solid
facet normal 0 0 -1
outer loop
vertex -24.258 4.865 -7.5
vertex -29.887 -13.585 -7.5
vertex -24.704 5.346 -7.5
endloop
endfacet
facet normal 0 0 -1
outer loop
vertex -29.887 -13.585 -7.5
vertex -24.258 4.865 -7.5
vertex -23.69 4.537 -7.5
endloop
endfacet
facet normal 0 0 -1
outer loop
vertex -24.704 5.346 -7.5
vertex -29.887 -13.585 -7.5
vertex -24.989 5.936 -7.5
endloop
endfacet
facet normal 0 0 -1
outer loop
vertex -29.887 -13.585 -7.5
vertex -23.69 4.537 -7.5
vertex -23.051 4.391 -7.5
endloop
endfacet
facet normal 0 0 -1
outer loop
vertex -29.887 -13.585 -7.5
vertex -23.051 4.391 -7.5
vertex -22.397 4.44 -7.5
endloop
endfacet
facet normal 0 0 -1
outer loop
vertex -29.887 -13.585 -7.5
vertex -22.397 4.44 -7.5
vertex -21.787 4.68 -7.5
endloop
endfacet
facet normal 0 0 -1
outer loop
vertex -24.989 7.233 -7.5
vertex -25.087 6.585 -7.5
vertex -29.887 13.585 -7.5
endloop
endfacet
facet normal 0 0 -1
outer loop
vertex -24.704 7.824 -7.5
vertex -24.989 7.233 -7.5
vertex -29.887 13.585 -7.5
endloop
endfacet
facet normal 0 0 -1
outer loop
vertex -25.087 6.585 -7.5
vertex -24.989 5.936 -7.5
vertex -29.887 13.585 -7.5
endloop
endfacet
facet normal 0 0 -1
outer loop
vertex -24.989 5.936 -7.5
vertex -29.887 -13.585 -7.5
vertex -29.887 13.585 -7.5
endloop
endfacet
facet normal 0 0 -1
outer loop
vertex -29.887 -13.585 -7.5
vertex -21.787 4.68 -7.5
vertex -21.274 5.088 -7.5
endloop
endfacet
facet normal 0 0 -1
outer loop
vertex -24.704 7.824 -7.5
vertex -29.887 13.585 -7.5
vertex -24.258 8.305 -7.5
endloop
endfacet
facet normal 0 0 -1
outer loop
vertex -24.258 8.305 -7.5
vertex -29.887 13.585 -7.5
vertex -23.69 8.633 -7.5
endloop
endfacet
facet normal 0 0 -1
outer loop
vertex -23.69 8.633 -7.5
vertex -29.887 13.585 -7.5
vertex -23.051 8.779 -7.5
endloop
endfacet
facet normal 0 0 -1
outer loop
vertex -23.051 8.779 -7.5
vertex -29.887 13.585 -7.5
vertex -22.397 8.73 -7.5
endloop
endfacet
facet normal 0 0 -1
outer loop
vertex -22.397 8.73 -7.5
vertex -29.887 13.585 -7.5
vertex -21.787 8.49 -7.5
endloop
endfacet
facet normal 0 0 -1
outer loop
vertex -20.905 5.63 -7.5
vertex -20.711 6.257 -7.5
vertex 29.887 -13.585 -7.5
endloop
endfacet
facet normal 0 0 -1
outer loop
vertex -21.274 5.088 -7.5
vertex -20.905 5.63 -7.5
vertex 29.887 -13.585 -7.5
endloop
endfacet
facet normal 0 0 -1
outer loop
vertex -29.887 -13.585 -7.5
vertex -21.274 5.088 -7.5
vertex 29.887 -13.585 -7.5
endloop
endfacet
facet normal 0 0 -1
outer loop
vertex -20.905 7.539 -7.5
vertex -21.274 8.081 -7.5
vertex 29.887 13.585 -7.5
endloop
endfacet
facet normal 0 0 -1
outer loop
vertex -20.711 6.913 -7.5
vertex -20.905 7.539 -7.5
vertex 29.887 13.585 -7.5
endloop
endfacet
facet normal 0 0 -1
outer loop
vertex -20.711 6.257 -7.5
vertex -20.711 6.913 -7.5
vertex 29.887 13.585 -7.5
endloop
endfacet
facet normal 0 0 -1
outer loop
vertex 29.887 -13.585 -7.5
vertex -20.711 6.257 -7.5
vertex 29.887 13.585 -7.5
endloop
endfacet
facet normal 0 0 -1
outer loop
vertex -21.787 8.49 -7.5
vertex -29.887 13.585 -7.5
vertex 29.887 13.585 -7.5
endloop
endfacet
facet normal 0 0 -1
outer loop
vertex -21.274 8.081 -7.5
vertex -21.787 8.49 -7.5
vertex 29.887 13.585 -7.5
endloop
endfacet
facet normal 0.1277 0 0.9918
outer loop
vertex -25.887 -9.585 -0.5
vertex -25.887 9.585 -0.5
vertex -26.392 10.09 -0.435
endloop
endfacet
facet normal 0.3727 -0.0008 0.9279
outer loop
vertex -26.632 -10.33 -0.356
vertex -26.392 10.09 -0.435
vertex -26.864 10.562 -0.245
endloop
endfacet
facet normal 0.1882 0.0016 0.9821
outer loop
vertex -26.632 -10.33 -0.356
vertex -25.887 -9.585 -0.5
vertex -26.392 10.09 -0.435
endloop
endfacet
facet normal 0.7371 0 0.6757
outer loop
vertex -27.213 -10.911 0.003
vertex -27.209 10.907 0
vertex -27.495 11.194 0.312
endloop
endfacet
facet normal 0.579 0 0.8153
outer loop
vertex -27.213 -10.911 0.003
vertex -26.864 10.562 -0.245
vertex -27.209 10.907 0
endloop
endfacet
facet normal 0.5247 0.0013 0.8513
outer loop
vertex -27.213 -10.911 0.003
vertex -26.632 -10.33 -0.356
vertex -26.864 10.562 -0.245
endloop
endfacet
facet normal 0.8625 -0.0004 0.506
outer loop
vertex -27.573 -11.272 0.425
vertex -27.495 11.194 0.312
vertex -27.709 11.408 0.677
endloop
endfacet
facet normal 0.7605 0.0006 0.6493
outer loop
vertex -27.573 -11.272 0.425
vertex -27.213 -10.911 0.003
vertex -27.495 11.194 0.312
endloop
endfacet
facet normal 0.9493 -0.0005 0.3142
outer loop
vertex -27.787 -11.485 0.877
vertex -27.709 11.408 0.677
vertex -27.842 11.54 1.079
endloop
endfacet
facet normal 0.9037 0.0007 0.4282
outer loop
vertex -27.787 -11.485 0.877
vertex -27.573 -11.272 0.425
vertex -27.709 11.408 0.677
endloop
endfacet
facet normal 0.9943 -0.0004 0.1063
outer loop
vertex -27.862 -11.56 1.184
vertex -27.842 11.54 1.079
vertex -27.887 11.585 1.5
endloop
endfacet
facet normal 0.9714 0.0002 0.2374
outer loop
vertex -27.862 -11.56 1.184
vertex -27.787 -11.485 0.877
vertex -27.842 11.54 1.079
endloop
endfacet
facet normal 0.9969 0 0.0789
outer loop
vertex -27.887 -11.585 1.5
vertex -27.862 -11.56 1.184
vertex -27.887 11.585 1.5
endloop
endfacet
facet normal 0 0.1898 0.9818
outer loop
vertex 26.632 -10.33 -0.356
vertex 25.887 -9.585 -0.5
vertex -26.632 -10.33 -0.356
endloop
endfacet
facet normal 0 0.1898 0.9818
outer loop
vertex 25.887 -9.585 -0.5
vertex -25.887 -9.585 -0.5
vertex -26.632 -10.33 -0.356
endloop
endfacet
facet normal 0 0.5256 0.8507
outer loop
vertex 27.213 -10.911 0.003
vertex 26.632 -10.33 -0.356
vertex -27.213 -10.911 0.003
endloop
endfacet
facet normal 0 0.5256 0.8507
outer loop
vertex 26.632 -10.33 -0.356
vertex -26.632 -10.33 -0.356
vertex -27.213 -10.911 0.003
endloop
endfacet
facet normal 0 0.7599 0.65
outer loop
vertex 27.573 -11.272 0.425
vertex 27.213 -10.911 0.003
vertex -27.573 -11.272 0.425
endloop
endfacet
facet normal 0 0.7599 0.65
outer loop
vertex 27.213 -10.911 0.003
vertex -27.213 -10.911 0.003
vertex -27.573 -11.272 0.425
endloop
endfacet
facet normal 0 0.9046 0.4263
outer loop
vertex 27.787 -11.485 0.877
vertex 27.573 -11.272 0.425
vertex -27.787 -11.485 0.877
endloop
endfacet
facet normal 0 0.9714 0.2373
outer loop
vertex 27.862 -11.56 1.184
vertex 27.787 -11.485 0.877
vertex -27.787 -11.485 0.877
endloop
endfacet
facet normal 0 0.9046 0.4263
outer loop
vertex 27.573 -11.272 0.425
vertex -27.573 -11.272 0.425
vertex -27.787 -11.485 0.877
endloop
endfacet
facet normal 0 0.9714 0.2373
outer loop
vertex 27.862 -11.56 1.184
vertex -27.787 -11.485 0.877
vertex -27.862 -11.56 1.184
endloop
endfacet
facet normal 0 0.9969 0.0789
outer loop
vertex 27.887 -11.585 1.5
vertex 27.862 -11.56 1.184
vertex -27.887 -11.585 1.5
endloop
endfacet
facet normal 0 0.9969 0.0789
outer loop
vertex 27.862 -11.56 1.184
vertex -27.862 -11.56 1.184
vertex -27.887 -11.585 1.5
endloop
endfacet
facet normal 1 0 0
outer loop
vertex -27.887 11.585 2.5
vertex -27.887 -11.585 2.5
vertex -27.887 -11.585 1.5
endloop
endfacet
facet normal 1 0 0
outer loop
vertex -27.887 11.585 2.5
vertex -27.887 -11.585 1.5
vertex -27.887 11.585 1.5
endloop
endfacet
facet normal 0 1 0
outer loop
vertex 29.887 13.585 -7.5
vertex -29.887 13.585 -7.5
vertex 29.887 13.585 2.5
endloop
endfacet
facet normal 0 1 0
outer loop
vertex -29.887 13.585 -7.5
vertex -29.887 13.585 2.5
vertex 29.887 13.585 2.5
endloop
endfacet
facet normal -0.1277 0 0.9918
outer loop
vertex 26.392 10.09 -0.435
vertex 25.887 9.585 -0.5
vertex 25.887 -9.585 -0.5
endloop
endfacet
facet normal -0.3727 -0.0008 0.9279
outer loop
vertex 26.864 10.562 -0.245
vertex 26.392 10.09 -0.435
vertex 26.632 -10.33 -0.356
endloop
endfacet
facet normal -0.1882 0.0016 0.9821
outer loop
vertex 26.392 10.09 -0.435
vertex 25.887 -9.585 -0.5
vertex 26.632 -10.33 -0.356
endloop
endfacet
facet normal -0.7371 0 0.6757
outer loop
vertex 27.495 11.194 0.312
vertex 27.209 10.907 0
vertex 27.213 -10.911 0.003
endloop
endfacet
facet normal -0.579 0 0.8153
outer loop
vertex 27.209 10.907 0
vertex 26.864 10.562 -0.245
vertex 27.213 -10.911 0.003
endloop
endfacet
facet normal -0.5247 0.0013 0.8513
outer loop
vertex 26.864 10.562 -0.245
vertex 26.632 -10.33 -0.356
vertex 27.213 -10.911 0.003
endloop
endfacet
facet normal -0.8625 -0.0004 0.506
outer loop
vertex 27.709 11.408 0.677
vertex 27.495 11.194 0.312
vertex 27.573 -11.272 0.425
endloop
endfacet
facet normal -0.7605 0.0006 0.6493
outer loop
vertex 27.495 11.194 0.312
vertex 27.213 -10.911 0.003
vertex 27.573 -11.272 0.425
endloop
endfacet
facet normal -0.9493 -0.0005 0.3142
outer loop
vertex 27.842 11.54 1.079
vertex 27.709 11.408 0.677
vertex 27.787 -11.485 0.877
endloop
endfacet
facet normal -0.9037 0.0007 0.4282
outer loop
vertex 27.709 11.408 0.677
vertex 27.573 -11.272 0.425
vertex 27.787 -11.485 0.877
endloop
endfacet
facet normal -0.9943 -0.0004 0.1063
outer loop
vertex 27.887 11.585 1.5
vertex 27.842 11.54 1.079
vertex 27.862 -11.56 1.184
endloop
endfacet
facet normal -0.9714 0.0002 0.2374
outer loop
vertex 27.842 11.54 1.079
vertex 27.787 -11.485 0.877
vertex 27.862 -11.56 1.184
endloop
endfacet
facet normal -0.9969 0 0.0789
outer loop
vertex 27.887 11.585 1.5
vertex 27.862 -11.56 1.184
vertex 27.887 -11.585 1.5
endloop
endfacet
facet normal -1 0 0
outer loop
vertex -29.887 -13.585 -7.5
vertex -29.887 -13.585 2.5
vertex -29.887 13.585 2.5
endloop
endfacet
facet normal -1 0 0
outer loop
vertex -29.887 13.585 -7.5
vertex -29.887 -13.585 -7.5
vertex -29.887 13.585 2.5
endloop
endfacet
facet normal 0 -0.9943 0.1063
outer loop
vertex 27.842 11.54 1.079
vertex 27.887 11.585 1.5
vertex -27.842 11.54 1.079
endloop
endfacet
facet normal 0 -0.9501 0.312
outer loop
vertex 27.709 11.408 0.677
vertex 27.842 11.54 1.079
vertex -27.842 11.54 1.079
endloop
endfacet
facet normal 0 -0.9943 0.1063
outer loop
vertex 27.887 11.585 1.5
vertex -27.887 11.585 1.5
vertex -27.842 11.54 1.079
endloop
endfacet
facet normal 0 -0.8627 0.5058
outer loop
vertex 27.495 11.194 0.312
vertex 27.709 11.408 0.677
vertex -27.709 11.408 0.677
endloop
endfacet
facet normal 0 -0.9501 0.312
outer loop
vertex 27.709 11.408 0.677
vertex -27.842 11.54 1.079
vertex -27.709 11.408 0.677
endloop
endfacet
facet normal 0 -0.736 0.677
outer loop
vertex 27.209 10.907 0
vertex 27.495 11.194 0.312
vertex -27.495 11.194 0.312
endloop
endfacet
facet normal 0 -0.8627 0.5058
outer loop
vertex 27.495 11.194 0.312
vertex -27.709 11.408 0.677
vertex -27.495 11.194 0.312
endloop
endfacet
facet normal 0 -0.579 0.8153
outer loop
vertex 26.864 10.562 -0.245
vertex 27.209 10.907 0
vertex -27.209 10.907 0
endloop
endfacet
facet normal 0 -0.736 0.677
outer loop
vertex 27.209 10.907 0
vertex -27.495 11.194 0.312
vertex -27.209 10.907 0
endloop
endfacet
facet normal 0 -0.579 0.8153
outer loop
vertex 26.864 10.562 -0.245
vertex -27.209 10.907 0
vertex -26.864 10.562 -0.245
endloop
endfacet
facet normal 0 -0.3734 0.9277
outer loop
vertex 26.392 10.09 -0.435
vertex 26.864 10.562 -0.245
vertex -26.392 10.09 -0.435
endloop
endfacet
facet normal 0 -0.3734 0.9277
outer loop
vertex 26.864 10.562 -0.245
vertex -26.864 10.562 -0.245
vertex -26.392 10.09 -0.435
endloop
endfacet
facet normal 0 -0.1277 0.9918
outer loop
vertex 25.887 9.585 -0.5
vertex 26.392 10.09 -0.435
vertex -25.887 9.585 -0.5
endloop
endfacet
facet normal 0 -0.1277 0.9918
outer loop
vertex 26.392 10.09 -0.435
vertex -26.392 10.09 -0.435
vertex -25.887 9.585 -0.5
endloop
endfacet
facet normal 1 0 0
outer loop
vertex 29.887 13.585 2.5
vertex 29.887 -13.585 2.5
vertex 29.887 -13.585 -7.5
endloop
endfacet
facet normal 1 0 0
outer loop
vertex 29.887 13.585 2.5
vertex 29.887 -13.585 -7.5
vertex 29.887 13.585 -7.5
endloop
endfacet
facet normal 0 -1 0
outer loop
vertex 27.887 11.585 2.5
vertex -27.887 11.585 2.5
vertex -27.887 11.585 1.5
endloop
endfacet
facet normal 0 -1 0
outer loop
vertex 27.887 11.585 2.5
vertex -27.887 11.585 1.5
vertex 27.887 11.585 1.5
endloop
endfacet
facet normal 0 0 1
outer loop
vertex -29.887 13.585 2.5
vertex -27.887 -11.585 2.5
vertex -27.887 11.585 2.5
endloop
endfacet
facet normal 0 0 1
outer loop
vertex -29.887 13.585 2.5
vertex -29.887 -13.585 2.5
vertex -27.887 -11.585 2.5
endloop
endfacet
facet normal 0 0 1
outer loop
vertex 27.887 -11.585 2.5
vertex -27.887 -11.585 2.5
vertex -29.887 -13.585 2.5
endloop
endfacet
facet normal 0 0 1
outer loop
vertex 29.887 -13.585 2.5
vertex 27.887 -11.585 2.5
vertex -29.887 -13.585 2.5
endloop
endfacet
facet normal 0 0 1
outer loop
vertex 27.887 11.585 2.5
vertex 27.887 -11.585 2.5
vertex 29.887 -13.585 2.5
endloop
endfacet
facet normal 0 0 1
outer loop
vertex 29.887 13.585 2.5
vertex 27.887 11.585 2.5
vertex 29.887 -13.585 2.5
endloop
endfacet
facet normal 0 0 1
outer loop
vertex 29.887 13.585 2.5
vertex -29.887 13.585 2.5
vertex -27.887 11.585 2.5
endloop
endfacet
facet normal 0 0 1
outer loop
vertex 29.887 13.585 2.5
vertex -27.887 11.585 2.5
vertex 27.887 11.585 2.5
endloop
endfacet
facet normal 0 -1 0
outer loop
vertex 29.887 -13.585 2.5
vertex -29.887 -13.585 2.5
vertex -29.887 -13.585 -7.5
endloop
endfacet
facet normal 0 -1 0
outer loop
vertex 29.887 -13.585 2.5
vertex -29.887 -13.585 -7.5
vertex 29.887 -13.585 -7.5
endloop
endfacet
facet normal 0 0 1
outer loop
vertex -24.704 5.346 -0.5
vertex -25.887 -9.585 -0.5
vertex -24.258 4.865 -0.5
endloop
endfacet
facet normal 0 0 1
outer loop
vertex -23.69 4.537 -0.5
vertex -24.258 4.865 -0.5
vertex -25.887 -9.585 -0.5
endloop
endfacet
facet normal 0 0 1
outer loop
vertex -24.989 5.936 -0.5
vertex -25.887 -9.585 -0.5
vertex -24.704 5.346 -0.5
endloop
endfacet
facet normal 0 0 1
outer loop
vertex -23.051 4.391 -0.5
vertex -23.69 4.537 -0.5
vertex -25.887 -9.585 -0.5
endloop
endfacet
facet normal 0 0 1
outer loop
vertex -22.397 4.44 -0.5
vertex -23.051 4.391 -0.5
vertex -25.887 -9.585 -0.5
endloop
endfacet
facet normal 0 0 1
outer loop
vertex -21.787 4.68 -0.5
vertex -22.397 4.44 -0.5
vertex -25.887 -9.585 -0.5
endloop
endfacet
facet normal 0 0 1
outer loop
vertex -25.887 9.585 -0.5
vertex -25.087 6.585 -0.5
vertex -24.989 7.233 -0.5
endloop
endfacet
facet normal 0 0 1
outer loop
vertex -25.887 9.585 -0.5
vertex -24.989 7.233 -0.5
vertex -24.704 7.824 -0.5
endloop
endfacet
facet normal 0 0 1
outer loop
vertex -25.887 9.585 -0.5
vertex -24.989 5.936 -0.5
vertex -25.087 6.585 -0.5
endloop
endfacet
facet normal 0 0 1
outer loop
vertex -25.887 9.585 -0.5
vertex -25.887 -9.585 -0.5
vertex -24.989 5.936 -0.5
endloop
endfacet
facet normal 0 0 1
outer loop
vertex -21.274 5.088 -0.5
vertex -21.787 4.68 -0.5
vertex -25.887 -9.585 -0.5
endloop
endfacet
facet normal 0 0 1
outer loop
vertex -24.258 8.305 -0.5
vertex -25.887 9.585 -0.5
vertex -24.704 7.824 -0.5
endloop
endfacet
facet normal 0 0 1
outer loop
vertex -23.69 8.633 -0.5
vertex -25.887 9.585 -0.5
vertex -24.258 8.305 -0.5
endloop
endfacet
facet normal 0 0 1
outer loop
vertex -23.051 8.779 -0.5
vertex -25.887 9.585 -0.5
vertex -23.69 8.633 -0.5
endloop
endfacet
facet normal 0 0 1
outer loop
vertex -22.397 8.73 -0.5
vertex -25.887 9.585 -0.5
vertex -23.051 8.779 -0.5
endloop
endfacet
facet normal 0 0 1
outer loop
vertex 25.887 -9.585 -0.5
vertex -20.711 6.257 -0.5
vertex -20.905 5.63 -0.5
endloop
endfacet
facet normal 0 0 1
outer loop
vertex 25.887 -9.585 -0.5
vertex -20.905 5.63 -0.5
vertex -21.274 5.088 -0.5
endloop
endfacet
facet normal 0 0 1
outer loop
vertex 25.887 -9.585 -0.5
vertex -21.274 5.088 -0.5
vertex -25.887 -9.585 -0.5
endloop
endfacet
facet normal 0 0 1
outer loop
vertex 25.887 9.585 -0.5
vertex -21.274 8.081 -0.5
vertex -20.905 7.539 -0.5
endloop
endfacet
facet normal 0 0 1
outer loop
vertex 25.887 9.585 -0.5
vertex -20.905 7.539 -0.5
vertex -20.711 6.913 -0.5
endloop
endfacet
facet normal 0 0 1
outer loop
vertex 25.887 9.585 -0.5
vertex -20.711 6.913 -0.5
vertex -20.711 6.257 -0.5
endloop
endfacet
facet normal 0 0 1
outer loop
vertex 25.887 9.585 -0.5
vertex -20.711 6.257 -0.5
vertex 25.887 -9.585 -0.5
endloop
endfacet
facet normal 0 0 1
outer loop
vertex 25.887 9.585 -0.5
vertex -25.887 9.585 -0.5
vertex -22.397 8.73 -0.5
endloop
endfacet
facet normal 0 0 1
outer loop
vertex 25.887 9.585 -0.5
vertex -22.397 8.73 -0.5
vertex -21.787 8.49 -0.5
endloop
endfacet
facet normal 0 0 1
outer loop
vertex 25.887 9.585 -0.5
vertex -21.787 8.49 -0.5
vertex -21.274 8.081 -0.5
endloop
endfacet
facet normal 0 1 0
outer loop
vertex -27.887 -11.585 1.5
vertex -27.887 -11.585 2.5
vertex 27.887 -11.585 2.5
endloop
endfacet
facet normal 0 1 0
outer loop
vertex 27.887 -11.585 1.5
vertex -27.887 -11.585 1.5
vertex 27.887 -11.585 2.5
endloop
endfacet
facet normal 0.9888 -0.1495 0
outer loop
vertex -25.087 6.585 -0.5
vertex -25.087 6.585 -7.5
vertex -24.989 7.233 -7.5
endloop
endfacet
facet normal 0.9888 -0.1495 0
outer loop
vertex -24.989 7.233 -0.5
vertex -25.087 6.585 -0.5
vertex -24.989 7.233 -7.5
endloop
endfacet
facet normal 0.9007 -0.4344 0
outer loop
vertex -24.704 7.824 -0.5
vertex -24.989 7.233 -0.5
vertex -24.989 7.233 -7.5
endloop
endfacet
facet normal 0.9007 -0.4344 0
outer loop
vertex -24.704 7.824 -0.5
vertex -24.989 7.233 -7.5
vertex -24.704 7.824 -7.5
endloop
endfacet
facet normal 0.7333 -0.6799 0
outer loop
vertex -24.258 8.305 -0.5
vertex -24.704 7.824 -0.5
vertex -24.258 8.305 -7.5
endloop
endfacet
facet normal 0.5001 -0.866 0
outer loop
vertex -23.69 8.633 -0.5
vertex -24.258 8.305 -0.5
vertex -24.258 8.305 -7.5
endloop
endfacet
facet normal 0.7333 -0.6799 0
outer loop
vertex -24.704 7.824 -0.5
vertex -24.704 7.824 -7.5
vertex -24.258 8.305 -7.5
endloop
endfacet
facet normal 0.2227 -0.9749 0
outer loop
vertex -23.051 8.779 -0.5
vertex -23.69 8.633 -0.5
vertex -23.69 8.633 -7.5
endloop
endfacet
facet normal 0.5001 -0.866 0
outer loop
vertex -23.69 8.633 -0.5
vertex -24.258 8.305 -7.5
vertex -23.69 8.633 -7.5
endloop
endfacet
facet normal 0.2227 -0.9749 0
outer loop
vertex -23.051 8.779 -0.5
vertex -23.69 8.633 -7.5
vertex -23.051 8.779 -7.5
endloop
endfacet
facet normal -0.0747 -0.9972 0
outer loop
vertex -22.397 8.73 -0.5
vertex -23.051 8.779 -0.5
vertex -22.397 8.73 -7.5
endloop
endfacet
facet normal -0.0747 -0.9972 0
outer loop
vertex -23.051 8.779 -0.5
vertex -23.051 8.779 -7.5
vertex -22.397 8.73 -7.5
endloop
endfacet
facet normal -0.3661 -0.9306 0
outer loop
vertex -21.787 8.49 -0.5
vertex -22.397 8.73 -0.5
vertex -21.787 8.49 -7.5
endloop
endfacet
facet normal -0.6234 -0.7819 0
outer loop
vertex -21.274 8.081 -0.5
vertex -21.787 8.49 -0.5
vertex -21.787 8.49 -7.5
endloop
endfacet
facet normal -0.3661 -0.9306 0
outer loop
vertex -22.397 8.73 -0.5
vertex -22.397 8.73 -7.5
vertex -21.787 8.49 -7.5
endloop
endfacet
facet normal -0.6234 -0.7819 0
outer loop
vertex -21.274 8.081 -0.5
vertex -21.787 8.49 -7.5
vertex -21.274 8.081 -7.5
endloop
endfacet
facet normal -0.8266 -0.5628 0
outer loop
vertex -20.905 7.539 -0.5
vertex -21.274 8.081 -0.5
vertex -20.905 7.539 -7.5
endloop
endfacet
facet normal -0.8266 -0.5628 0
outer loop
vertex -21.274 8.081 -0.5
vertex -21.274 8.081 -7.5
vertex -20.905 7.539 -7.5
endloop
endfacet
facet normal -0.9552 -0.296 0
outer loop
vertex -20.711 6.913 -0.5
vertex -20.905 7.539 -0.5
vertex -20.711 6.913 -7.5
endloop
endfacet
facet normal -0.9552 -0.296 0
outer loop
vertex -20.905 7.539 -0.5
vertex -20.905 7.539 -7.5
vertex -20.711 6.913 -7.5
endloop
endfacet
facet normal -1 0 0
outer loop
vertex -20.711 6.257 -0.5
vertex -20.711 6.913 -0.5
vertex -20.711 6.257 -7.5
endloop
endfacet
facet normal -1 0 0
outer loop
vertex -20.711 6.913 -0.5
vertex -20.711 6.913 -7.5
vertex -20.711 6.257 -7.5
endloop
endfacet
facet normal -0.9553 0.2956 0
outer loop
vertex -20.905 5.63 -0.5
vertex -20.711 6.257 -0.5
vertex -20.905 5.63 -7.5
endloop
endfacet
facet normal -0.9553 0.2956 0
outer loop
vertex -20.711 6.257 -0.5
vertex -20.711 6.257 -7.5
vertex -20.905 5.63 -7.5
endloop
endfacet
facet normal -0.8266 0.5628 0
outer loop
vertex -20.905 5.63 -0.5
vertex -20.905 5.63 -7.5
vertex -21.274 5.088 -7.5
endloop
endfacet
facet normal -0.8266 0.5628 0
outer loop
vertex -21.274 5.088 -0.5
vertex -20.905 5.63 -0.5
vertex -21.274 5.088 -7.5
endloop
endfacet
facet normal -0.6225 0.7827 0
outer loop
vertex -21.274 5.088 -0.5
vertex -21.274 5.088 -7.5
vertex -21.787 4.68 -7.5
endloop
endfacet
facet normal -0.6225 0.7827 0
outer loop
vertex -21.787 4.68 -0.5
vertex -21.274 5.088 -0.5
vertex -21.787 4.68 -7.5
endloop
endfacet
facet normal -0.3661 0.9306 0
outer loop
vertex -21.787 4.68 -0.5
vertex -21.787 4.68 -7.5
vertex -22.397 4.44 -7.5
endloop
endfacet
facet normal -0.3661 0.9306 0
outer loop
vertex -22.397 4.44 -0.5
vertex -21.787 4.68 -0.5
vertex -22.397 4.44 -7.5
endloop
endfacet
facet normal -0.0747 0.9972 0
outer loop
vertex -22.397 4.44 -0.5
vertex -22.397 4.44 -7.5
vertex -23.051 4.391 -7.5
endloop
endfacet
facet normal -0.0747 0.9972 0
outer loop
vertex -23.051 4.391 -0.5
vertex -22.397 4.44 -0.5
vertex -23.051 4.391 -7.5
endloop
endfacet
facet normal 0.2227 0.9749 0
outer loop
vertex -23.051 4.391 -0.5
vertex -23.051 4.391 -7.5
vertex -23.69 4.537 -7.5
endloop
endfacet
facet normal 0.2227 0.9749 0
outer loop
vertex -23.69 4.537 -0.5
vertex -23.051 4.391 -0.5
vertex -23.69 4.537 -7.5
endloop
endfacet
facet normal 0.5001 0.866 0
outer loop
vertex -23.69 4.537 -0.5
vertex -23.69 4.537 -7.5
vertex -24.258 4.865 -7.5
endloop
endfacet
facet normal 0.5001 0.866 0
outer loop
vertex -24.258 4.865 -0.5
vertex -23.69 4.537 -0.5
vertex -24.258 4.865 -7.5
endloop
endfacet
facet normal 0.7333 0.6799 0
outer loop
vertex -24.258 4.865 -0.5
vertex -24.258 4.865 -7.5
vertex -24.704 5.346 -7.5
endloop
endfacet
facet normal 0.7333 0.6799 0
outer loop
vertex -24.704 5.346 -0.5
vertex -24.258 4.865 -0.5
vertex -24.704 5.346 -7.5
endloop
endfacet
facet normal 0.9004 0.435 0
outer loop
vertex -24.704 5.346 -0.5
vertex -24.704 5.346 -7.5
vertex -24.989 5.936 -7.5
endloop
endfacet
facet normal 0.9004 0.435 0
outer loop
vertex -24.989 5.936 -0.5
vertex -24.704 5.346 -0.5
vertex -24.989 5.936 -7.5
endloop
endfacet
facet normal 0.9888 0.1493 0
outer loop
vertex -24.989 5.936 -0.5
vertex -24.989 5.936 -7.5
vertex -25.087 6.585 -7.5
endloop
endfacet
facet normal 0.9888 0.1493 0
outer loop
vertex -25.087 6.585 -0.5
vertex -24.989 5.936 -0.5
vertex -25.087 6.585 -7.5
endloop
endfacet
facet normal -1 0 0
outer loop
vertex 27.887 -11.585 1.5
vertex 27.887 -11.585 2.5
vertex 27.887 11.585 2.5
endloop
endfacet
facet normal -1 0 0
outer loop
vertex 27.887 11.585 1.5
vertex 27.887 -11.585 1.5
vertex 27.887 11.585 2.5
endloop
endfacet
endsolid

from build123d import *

# Parameters (mm, degrees)
F0_W     = 59.7732812166
F0_H     = 27.1696727723
F1_DEPTH = 2.5
F2_T     = -2
F3_DEPTH = 5
F4_R     = 2
F6_D     = 4.4


with BuildPart() as f1:
    # F0 (on Top) → F1 (new body, symmetric)
    with BuildSketch(Plane.XY):
        Rectangle(F0_W, F0_H)
    extrude(amount=F1_DEPTH, both=True)

    # F2
    f2_openings = [f1.faces().sort_by_distance(p)[0] for p in [
        (0, 0, 2.5),
    ]]
    offset(amount=F2_T, openings=f2_openings)

    # F3 (add): a face of the model
    f3_faces = [f1.faces().sort_by_distance(p)[0] for p in [
        (0, 0, -2.5),
    ]]
    extrude(f3_faces, amount=F3_DEPTH)

    # F4
    f4_edges = [f1.edges().sort_by_distance(p)[0] for p in [
        (0, 11.584836, -0.5),
        (0, -11.584836, -0.5),
        (27.886641, 0, -0.5),
        (-27.886641, 0, -0.5),
    ]]
    fillet(f4_edges, radius=F4_R)

    # F6 (through all)
    with Locations(Plane.XY):
        with Locations((-22.8866406083, 6.5848363861)):
            Hole(F6_D / 2)


solid = f1.part
